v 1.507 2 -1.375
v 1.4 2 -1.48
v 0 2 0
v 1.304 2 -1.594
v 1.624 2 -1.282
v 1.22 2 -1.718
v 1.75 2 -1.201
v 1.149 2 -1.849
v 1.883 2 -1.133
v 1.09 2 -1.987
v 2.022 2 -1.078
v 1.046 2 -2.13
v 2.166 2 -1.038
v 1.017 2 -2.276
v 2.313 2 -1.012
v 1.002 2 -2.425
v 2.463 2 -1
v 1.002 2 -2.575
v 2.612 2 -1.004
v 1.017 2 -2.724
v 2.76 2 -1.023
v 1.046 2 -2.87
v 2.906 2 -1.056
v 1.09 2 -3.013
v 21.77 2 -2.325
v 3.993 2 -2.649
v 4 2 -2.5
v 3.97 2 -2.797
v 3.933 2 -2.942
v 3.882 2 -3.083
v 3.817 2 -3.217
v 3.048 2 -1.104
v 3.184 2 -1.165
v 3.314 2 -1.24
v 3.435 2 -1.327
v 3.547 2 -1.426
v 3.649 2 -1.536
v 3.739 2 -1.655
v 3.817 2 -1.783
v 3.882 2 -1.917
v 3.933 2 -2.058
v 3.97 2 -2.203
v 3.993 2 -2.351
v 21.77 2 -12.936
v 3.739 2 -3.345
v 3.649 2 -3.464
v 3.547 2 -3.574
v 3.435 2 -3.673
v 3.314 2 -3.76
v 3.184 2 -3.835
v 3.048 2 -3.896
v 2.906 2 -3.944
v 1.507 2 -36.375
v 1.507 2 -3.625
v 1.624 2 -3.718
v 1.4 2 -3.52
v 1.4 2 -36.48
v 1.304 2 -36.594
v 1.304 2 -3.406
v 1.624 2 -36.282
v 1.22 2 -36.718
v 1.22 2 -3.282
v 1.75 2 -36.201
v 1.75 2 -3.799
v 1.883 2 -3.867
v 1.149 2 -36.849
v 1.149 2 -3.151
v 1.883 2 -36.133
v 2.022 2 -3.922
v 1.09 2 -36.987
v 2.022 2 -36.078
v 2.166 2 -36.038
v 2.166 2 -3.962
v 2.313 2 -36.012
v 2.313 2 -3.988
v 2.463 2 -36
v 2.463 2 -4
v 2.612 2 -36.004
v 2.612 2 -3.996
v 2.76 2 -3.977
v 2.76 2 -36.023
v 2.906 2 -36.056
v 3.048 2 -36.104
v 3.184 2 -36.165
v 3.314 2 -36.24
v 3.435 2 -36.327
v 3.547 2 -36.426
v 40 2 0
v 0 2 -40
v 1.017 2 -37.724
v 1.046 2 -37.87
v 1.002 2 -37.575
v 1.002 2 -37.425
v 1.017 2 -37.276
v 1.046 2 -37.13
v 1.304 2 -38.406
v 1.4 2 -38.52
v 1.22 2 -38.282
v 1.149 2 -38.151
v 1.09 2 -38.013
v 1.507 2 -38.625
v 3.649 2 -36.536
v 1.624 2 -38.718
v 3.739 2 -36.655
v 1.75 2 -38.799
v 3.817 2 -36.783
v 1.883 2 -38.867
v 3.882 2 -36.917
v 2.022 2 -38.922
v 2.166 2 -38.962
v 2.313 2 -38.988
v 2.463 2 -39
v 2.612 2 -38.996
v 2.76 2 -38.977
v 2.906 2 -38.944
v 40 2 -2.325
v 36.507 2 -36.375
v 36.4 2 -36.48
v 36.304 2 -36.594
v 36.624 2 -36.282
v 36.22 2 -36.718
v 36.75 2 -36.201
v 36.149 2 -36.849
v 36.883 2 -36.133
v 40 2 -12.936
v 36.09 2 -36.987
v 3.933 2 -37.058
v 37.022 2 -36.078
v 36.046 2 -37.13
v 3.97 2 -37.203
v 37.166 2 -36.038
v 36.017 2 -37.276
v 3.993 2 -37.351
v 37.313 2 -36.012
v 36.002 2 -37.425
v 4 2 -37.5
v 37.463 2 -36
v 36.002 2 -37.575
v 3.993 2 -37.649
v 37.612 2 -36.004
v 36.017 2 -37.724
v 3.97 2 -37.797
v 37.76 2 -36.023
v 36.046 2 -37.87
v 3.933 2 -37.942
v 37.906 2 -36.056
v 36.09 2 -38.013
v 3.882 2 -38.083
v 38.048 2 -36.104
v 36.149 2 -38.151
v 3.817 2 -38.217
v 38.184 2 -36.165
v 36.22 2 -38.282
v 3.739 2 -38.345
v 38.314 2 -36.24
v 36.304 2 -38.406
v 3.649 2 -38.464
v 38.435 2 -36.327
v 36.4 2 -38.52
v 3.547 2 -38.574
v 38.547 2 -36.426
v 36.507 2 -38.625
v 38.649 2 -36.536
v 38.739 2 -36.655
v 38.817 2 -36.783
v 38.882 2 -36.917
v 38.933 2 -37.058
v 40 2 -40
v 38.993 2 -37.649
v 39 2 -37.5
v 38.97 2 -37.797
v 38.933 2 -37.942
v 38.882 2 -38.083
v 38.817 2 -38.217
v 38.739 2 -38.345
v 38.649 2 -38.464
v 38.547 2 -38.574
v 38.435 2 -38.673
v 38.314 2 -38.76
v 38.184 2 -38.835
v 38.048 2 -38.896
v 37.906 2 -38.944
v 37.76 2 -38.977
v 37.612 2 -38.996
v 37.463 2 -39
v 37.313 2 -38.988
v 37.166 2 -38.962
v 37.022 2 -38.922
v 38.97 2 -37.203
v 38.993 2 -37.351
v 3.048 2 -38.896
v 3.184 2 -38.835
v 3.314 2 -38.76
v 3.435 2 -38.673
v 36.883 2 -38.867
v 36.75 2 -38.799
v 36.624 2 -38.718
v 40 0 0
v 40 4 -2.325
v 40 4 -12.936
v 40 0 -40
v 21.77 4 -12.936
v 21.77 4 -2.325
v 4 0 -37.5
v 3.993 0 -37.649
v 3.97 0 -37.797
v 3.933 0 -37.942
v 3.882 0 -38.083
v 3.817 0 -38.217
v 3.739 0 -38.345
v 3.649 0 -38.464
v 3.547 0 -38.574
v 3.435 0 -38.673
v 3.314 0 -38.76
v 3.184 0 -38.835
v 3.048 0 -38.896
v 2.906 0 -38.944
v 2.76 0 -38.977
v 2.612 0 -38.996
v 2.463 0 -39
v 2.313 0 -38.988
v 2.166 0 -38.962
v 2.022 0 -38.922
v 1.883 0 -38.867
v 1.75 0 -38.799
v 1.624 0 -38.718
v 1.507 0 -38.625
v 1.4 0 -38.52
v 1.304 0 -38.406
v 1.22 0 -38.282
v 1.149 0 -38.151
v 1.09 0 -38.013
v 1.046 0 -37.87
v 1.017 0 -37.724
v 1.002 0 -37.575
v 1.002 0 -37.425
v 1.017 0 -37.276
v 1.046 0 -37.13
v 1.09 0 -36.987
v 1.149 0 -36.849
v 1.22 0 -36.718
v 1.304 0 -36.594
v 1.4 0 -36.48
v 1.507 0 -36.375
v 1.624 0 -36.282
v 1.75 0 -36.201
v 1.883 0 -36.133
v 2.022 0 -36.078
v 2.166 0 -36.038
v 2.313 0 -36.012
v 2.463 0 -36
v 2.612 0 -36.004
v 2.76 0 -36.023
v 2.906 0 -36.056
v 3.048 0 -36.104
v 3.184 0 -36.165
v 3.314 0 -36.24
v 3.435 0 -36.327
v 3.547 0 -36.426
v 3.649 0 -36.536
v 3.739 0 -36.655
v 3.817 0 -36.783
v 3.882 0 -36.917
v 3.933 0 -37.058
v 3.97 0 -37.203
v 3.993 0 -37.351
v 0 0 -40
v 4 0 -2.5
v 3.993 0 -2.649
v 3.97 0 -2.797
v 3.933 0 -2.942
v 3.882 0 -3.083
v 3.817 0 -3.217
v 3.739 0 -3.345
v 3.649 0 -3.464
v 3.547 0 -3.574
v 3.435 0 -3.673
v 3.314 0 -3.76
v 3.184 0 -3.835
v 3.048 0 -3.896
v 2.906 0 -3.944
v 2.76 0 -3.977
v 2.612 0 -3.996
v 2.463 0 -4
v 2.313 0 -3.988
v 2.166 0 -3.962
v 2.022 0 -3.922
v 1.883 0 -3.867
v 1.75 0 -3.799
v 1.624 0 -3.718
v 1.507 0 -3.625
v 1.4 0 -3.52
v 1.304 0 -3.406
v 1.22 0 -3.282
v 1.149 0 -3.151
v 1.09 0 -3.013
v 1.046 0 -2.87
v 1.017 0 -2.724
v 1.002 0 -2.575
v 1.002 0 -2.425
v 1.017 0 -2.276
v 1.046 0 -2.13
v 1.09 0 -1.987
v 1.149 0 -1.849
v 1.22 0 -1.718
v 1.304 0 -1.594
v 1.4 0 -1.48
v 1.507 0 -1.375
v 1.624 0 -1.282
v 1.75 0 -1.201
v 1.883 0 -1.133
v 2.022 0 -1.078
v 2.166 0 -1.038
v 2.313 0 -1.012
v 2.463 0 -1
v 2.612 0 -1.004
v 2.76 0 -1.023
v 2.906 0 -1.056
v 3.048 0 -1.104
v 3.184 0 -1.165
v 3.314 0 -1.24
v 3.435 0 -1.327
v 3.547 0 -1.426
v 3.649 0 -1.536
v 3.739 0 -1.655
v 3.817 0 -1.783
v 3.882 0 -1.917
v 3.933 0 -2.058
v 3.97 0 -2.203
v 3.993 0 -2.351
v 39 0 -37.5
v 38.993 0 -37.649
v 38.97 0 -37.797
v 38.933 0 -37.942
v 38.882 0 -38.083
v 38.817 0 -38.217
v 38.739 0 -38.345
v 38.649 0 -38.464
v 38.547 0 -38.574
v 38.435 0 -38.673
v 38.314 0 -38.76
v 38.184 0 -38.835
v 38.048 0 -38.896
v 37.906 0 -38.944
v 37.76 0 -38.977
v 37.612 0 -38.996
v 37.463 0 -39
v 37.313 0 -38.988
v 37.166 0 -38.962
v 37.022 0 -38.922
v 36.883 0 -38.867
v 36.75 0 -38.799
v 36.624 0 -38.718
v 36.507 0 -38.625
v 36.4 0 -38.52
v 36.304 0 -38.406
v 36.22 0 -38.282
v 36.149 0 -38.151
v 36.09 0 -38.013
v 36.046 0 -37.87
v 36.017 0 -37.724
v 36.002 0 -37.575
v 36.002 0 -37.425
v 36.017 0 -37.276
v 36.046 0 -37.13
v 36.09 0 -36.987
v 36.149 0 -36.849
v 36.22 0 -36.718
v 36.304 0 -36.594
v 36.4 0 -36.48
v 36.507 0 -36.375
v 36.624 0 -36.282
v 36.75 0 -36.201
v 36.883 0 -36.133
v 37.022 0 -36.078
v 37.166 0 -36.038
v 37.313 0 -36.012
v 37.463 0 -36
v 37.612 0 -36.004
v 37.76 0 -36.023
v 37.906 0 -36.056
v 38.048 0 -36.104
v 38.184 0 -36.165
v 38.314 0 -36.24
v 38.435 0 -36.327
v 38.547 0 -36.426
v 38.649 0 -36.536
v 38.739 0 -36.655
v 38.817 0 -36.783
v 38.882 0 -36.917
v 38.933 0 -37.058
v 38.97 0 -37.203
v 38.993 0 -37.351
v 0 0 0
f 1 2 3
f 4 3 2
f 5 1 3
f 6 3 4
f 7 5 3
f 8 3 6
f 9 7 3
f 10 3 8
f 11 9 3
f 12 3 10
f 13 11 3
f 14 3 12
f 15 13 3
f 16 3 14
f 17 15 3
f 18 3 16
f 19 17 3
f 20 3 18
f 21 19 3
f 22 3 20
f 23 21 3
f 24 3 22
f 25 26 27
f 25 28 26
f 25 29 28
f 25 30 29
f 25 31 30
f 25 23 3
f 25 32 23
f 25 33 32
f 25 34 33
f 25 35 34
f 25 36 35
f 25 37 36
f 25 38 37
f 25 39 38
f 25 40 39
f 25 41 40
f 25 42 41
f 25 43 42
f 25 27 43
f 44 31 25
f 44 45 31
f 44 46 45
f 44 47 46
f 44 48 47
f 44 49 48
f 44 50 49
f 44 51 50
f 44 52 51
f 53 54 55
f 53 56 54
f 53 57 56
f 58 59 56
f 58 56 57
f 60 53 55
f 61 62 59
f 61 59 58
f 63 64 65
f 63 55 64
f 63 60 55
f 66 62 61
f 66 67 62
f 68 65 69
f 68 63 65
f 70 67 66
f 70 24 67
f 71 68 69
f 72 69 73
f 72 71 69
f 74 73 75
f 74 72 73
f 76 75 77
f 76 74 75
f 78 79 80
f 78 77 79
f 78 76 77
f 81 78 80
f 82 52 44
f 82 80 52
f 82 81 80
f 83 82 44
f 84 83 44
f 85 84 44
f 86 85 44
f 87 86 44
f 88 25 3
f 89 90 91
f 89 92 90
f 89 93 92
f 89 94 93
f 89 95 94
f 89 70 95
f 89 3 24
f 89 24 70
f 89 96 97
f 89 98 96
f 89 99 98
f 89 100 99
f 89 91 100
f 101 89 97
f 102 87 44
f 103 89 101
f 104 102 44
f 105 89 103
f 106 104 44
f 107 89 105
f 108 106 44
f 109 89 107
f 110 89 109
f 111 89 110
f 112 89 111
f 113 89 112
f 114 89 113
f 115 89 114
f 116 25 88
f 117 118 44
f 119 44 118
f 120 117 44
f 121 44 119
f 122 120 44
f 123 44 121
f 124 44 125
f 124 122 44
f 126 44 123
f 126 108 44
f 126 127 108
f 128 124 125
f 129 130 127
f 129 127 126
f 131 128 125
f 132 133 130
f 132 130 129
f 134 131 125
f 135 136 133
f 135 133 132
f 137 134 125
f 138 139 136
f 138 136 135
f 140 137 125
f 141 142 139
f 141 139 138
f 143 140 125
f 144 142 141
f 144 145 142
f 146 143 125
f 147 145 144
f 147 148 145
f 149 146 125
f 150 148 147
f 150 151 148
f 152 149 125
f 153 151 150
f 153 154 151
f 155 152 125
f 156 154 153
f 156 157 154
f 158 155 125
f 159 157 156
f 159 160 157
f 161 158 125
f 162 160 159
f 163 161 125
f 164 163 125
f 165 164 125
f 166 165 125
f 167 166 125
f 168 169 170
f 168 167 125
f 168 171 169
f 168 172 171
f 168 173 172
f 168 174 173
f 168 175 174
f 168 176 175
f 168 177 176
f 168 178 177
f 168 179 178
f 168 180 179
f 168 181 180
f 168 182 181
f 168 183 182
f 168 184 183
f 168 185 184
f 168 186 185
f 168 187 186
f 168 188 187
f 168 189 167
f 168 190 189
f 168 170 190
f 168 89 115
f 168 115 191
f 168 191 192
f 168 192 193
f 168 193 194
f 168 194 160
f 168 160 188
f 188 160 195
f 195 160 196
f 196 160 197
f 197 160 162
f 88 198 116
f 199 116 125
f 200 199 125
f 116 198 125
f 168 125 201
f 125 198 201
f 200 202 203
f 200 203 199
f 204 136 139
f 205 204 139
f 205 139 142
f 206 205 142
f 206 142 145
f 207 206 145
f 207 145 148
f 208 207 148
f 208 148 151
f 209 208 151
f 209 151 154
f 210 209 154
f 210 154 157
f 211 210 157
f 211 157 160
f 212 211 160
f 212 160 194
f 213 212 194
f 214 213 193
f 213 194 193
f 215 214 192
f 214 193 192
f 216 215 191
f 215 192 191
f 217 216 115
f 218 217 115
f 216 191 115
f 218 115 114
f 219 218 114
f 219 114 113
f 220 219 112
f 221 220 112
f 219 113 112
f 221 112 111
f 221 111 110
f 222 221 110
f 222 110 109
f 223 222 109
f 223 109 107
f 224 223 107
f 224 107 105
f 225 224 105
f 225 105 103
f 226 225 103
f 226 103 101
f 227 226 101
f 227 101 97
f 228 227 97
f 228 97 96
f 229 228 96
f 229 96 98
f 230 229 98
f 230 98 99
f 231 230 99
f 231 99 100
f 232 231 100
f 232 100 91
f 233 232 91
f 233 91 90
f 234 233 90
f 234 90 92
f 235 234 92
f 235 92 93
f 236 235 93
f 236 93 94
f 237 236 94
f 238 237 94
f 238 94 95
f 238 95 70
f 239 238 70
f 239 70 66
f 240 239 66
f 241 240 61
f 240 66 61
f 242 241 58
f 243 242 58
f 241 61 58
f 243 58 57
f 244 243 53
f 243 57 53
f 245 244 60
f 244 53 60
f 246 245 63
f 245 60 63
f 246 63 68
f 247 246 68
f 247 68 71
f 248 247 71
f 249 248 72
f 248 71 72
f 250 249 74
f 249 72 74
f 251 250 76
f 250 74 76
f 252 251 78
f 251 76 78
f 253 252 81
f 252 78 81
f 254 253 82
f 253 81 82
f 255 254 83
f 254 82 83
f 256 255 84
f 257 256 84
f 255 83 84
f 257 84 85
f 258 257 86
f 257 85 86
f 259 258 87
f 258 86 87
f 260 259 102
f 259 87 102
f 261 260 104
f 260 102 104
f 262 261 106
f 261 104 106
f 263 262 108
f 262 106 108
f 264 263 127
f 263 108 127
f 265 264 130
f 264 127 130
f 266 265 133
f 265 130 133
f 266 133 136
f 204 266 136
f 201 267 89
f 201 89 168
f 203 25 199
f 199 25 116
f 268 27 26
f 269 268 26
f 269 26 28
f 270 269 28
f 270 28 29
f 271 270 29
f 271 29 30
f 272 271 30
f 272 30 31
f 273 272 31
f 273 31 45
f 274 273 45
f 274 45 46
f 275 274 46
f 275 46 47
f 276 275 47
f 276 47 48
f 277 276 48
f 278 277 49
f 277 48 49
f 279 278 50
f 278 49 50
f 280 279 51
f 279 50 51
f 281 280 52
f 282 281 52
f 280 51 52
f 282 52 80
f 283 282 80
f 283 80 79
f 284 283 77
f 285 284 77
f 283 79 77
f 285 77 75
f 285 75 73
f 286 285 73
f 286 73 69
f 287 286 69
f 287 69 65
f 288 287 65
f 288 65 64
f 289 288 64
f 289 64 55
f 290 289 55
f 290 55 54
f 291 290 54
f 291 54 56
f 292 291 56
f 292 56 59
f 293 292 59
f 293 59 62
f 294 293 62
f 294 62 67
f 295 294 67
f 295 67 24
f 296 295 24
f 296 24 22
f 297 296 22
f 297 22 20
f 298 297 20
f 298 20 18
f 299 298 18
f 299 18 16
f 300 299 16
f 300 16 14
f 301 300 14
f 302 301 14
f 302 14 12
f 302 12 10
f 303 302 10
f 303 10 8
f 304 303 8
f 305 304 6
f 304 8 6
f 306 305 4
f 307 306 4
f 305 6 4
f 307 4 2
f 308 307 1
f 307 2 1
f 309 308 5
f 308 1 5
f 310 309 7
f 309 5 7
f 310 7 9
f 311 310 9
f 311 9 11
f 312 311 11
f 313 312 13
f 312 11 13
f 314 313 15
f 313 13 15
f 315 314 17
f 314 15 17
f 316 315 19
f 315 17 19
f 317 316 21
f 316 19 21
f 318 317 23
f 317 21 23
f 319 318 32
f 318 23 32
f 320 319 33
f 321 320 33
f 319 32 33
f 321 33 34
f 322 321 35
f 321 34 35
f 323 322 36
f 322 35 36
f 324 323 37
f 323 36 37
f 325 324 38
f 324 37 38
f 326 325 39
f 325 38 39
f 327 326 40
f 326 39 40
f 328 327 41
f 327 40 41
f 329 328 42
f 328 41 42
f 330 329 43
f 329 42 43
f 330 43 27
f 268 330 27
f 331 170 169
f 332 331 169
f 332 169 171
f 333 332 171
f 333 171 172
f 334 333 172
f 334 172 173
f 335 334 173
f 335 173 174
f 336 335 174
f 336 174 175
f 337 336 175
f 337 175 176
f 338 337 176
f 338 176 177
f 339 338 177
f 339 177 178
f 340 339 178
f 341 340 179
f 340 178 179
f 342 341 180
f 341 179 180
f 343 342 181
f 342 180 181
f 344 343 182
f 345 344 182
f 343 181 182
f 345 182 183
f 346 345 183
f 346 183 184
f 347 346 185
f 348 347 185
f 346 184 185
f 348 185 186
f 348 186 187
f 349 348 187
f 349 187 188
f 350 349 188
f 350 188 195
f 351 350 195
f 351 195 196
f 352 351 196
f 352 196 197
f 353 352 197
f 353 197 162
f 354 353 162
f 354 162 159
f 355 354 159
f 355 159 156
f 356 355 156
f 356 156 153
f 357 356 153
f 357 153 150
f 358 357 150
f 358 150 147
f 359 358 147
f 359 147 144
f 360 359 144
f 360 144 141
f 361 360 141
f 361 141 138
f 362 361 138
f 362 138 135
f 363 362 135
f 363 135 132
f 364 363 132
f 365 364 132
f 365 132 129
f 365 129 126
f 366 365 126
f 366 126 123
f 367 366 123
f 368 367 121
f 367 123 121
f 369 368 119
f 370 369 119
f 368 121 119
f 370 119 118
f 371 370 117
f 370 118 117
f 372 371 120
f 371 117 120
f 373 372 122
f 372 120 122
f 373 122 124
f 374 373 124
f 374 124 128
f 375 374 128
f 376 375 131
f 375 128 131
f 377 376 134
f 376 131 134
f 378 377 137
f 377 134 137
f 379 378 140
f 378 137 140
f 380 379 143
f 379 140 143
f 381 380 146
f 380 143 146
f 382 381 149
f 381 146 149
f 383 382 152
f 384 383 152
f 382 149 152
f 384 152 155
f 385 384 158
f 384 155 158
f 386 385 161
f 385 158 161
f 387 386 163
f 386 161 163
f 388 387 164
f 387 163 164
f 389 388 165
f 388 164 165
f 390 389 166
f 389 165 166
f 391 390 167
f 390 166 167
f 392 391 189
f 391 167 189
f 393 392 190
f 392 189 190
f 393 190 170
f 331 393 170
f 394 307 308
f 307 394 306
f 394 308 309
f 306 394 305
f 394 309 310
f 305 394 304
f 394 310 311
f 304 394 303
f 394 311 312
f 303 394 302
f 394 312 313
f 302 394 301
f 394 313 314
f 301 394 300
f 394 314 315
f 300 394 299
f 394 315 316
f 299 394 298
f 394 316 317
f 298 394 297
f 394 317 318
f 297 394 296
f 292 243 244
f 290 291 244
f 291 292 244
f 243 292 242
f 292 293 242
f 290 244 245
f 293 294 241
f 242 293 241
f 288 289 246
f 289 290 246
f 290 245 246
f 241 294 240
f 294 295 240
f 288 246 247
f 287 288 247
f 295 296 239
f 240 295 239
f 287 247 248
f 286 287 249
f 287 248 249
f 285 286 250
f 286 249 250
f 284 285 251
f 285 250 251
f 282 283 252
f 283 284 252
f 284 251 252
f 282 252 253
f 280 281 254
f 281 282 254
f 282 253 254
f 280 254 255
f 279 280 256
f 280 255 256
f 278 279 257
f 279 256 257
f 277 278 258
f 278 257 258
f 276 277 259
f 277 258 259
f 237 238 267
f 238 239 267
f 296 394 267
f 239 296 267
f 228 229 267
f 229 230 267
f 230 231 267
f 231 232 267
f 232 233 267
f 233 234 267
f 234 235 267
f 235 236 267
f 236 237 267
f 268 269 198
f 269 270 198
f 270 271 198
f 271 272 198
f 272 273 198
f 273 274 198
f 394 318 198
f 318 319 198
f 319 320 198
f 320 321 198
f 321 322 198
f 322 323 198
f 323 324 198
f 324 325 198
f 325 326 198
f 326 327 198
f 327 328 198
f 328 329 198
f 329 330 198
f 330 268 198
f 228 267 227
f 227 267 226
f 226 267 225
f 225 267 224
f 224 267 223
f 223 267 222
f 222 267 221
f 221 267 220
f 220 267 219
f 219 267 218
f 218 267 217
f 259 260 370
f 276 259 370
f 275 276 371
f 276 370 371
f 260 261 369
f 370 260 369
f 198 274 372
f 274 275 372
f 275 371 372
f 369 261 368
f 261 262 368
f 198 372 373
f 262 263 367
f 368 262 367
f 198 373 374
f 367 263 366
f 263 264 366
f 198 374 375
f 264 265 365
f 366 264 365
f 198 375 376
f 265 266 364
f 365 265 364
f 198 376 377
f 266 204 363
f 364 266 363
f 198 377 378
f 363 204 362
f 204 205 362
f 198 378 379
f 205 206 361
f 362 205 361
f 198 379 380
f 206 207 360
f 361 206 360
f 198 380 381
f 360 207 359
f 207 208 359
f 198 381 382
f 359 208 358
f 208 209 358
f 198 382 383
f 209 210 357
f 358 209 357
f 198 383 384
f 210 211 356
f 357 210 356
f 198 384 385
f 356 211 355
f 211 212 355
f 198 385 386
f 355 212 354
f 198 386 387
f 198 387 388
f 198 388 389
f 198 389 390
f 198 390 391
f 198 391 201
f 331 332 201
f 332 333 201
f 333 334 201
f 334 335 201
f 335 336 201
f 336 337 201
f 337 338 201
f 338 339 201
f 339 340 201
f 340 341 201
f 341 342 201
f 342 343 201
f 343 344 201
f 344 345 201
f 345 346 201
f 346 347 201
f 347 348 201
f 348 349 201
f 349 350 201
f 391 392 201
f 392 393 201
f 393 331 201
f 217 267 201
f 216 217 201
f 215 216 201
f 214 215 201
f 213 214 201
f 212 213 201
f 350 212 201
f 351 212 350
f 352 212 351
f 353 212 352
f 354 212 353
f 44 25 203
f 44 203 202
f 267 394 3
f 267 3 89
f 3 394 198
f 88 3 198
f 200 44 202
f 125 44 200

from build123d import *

# Parameters (mm, degrees)
SKETCH1_W           = 40
SKETCH1_H           = 40
BOSS_EXTRUDE1_DEPTH = 2
SKETCH2_R           = 1.5
CUT_EXTRUDE1_DEPTH  = 3
SKETCH3_W           = 18.229825434
SKETCH3_H           = 10.610339614
BOSS_EXTRUDE2_DEPTH = 2


with BuildPart() as part:
    # Sketch1 → Boss-Extrude1 (new body)
    with BuildSketch(Plane(origin=(0, 0, 0), x_dir=(1, 0, 0), z_dir=(0, 1, 0))):
        with Locations((20, 20)):
            Rectangle(SKETCH1_W, SKETCH1_H)
    extrude(amount=BOSS_EXTRUDE1_DEPTH)

    # Sketch2 → Cut-Extrude1 (cut, through all)
    with BuildSketch(Plane(origin=(0, 2, 0), x_dir=(1, 0, 0), z_dir=(0, 1, 0))):
        with Locations((2.5, 37.5)):
            Circle(SKETCH2_R)
        with Locations((37.5, 37.5)):
            Circle(SKETCH2_R)
        with Locations((2.5, 2.5)):
            Circle(SKETCH2_R)
    extrude(amount=-CUT_EXTRUDE1_DEPTH, mode=Mode.SUBTRACT)

    # Sketch3 → Boss-Extrude2 (add)
    with BuildSketch(Plane(origin=(0, 2, 0), x_dir=(1, 0, 0), z_dir=(0, 1, 0))):
        with Locations((30.885087283, 7.630399835)):
            Rectangle(SKETCH3_W, SKETCH3_H)
    extrude(amount=BOSS_EXTRUDE2_DEPTH)


solid = part.part
